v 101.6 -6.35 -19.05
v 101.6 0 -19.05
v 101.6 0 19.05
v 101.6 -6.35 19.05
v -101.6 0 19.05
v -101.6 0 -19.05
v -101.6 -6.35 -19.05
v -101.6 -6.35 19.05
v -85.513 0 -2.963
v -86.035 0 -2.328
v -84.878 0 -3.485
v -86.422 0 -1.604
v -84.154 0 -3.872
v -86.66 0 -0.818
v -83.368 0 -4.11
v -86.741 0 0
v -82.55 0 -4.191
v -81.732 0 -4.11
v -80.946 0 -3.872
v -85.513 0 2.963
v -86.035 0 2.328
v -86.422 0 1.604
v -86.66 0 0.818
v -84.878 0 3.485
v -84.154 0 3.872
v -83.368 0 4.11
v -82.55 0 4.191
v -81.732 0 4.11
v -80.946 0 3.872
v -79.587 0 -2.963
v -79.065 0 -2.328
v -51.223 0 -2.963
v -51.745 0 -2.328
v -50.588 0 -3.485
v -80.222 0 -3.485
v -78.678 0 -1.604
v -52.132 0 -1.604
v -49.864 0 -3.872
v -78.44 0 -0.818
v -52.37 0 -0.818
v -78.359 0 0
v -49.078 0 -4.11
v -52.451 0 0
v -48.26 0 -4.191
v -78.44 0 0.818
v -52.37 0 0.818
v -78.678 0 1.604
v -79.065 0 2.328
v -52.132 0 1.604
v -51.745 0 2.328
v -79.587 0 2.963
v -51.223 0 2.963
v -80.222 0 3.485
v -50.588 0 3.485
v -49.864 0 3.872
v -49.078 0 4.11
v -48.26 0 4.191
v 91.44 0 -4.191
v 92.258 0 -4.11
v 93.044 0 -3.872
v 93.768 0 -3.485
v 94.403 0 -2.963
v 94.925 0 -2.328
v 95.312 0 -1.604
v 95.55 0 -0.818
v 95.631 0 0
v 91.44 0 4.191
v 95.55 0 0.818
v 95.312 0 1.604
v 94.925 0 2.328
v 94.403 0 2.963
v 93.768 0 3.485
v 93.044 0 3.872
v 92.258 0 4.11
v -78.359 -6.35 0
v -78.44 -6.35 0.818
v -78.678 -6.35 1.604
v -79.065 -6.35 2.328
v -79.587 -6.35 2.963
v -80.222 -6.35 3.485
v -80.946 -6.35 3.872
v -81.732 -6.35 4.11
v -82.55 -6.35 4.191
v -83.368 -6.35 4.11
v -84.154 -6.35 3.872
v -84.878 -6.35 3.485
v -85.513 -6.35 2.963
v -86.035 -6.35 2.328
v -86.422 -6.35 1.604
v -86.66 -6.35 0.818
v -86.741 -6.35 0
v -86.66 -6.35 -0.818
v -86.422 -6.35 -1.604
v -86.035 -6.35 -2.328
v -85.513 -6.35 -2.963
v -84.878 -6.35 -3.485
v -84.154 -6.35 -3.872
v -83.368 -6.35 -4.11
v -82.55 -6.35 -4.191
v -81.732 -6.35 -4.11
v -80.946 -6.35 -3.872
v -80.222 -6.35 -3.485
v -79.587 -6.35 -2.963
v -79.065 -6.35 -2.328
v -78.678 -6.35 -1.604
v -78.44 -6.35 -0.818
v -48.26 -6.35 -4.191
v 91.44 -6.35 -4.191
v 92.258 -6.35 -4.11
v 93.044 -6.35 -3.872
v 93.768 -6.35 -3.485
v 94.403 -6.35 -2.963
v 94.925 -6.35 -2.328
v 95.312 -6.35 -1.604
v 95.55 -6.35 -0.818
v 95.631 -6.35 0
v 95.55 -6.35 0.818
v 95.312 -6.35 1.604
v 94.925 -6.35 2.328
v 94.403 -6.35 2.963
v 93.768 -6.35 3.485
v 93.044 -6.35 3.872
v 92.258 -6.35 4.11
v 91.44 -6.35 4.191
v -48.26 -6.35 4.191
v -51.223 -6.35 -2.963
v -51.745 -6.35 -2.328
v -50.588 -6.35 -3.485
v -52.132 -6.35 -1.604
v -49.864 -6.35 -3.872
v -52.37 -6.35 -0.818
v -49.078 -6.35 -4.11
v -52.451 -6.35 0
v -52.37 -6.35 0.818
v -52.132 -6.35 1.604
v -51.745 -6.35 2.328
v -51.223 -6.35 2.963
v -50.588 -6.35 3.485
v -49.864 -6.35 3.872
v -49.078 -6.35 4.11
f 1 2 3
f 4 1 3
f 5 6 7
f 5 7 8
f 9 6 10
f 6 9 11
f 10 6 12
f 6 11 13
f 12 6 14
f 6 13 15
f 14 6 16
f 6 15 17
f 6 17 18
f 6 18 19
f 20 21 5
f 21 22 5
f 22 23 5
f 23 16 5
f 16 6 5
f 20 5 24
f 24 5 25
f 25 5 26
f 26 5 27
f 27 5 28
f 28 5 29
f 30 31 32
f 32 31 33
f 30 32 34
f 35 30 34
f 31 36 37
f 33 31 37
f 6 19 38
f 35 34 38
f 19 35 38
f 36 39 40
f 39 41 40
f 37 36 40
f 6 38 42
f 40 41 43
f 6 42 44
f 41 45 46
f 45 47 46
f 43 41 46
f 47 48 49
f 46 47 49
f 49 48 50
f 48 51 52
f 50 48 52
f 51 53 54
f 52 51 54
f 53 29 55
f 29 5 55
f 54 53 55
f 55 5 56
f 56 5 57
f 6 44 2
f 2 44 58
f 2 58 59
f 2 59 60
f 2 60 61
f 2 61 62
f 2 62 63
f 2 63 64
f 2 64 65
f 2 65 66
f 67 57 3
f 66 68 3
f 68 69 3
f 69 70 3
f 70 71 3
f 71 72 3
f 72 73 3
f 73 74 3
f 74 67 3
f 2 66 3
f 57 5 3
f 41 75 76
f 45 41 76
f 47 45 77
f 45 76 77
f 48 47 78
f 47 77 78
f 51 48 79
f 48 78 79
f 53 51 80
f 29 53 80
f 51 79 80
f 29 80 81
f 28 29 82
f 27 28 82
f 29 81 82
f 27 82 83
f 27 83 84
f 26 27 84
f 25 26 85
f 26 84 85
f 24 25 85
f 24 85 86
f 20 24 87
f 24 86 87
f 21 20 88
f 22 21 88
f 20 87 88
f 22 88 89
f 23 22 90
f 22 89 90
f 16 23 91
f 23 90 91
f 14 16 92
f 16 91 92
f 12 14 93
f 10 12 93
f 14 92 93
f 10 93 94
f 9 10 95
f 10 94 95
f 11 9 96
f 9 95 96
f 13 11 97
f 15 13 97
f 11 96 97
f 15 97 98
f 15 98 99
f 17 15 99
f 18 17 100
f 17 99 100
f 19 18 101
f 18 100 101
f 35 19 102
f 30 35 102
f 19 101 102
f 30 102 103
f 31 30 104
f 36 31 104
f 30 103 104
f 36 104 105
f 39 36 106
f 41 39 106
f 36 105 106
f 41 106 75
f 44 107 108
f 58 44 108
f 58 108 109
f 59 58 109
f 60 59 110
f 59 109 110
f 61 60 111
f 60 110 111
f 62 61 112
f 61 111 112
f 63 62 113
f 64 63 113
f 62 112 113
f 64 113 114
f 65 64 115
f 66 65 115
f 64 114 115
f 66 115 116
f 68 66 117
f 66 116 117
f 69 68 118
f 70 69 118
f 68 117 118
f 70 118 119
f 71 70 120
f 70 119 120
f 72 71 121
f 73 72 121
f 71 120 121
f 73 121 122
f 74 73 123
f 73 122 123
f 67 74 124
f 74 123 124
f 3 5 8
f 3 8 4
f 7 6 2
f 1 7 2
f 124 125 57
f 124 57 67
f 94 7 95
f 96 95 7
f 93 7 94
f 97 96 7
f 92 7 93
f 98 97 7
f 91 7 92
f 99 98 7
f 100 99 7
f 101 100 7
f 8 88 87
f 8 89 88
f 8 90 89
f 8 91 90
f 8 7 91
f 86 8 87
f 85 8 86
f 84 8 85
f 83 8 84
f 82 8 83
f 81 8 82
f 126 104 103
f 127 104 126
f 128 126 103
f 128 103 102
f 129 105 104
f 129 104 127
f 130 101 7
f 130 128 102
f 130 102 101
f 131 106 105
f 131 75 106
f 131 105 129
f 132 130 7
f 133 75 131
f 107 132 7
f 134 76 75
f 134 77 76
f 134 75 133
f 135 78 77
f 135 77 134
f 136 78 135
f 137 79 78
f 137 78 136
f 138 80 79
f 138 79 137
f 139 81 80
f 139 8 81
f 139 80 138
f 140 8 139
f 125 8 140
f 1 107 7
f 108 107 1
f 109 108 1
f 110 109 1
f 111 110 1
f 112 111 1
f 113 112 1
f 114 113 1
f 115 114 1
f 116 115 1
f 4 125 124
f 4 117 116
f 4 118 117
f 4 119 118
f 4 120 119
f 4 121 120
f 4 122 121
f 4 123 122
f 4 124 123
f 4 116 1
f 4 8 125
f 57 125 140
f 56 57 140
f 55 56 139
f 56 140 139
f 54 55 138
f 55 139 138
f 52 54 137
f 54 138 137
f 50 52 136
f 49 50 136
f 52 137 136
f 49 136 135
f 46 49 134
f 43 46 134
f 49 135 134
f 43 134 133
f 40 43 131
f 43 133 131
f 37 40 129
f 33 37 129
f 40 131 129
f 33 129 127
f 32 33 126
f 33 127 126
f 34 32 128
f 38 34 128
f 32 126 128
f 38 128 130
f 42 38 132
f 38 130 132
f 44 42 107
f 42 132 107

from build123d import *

# Parameters (mm, degrees)
F0_W     = 203.2
F0_H     = 38.1
F1_DEPTH = 6.35
F2_R     = 4.191
F3_DEPTH = 6.35
F4_W     = 139.7
F4_H     = 8.382
F5_DEPTH = 25.4


with BuildPart() as f1:
    # F0 (on Front) → F1 (new body)
    with BuildSketch(Plane.XZ):
        Rectangle(F0_W, F0_H)
    extrude(amount=F1_DEPTH)

    # F2 (on face) → F3 (cut, through all)
    with BuildSketch(Plane.XZ.offset(6.35)):
        with Locations((-82.55, 0)):
            Circle(F2_R)
    extrude(amount=-F3_DEPTH, mode=Mode.SUBTRACT)

    # F4 (on face) → F5 (cut)
    with BuildSketch(Plane.XZ.offset(6.35)):
        with Locations((21.59, 0)):
            Rectangle(F4_W, F4_H)
        with BuildLine():
            Line((91.44, 4.191), (91.44, -4.191))
            ThreePointArc((91.44, -4.191), (95.631, 0), (91.44, 4.191))
        make_face()
        with BuildLine():
            ThreePointArc((-48.26, 4.191), (-52.451, 0), (-48.26, -4.191))
            Line((-48.26, -4.191), (-48.26, 4.191))
        make_face()
    extrude(amount=-F5_DEPTH, mode=Mode.SUBTRACT)


solid = f1.part
